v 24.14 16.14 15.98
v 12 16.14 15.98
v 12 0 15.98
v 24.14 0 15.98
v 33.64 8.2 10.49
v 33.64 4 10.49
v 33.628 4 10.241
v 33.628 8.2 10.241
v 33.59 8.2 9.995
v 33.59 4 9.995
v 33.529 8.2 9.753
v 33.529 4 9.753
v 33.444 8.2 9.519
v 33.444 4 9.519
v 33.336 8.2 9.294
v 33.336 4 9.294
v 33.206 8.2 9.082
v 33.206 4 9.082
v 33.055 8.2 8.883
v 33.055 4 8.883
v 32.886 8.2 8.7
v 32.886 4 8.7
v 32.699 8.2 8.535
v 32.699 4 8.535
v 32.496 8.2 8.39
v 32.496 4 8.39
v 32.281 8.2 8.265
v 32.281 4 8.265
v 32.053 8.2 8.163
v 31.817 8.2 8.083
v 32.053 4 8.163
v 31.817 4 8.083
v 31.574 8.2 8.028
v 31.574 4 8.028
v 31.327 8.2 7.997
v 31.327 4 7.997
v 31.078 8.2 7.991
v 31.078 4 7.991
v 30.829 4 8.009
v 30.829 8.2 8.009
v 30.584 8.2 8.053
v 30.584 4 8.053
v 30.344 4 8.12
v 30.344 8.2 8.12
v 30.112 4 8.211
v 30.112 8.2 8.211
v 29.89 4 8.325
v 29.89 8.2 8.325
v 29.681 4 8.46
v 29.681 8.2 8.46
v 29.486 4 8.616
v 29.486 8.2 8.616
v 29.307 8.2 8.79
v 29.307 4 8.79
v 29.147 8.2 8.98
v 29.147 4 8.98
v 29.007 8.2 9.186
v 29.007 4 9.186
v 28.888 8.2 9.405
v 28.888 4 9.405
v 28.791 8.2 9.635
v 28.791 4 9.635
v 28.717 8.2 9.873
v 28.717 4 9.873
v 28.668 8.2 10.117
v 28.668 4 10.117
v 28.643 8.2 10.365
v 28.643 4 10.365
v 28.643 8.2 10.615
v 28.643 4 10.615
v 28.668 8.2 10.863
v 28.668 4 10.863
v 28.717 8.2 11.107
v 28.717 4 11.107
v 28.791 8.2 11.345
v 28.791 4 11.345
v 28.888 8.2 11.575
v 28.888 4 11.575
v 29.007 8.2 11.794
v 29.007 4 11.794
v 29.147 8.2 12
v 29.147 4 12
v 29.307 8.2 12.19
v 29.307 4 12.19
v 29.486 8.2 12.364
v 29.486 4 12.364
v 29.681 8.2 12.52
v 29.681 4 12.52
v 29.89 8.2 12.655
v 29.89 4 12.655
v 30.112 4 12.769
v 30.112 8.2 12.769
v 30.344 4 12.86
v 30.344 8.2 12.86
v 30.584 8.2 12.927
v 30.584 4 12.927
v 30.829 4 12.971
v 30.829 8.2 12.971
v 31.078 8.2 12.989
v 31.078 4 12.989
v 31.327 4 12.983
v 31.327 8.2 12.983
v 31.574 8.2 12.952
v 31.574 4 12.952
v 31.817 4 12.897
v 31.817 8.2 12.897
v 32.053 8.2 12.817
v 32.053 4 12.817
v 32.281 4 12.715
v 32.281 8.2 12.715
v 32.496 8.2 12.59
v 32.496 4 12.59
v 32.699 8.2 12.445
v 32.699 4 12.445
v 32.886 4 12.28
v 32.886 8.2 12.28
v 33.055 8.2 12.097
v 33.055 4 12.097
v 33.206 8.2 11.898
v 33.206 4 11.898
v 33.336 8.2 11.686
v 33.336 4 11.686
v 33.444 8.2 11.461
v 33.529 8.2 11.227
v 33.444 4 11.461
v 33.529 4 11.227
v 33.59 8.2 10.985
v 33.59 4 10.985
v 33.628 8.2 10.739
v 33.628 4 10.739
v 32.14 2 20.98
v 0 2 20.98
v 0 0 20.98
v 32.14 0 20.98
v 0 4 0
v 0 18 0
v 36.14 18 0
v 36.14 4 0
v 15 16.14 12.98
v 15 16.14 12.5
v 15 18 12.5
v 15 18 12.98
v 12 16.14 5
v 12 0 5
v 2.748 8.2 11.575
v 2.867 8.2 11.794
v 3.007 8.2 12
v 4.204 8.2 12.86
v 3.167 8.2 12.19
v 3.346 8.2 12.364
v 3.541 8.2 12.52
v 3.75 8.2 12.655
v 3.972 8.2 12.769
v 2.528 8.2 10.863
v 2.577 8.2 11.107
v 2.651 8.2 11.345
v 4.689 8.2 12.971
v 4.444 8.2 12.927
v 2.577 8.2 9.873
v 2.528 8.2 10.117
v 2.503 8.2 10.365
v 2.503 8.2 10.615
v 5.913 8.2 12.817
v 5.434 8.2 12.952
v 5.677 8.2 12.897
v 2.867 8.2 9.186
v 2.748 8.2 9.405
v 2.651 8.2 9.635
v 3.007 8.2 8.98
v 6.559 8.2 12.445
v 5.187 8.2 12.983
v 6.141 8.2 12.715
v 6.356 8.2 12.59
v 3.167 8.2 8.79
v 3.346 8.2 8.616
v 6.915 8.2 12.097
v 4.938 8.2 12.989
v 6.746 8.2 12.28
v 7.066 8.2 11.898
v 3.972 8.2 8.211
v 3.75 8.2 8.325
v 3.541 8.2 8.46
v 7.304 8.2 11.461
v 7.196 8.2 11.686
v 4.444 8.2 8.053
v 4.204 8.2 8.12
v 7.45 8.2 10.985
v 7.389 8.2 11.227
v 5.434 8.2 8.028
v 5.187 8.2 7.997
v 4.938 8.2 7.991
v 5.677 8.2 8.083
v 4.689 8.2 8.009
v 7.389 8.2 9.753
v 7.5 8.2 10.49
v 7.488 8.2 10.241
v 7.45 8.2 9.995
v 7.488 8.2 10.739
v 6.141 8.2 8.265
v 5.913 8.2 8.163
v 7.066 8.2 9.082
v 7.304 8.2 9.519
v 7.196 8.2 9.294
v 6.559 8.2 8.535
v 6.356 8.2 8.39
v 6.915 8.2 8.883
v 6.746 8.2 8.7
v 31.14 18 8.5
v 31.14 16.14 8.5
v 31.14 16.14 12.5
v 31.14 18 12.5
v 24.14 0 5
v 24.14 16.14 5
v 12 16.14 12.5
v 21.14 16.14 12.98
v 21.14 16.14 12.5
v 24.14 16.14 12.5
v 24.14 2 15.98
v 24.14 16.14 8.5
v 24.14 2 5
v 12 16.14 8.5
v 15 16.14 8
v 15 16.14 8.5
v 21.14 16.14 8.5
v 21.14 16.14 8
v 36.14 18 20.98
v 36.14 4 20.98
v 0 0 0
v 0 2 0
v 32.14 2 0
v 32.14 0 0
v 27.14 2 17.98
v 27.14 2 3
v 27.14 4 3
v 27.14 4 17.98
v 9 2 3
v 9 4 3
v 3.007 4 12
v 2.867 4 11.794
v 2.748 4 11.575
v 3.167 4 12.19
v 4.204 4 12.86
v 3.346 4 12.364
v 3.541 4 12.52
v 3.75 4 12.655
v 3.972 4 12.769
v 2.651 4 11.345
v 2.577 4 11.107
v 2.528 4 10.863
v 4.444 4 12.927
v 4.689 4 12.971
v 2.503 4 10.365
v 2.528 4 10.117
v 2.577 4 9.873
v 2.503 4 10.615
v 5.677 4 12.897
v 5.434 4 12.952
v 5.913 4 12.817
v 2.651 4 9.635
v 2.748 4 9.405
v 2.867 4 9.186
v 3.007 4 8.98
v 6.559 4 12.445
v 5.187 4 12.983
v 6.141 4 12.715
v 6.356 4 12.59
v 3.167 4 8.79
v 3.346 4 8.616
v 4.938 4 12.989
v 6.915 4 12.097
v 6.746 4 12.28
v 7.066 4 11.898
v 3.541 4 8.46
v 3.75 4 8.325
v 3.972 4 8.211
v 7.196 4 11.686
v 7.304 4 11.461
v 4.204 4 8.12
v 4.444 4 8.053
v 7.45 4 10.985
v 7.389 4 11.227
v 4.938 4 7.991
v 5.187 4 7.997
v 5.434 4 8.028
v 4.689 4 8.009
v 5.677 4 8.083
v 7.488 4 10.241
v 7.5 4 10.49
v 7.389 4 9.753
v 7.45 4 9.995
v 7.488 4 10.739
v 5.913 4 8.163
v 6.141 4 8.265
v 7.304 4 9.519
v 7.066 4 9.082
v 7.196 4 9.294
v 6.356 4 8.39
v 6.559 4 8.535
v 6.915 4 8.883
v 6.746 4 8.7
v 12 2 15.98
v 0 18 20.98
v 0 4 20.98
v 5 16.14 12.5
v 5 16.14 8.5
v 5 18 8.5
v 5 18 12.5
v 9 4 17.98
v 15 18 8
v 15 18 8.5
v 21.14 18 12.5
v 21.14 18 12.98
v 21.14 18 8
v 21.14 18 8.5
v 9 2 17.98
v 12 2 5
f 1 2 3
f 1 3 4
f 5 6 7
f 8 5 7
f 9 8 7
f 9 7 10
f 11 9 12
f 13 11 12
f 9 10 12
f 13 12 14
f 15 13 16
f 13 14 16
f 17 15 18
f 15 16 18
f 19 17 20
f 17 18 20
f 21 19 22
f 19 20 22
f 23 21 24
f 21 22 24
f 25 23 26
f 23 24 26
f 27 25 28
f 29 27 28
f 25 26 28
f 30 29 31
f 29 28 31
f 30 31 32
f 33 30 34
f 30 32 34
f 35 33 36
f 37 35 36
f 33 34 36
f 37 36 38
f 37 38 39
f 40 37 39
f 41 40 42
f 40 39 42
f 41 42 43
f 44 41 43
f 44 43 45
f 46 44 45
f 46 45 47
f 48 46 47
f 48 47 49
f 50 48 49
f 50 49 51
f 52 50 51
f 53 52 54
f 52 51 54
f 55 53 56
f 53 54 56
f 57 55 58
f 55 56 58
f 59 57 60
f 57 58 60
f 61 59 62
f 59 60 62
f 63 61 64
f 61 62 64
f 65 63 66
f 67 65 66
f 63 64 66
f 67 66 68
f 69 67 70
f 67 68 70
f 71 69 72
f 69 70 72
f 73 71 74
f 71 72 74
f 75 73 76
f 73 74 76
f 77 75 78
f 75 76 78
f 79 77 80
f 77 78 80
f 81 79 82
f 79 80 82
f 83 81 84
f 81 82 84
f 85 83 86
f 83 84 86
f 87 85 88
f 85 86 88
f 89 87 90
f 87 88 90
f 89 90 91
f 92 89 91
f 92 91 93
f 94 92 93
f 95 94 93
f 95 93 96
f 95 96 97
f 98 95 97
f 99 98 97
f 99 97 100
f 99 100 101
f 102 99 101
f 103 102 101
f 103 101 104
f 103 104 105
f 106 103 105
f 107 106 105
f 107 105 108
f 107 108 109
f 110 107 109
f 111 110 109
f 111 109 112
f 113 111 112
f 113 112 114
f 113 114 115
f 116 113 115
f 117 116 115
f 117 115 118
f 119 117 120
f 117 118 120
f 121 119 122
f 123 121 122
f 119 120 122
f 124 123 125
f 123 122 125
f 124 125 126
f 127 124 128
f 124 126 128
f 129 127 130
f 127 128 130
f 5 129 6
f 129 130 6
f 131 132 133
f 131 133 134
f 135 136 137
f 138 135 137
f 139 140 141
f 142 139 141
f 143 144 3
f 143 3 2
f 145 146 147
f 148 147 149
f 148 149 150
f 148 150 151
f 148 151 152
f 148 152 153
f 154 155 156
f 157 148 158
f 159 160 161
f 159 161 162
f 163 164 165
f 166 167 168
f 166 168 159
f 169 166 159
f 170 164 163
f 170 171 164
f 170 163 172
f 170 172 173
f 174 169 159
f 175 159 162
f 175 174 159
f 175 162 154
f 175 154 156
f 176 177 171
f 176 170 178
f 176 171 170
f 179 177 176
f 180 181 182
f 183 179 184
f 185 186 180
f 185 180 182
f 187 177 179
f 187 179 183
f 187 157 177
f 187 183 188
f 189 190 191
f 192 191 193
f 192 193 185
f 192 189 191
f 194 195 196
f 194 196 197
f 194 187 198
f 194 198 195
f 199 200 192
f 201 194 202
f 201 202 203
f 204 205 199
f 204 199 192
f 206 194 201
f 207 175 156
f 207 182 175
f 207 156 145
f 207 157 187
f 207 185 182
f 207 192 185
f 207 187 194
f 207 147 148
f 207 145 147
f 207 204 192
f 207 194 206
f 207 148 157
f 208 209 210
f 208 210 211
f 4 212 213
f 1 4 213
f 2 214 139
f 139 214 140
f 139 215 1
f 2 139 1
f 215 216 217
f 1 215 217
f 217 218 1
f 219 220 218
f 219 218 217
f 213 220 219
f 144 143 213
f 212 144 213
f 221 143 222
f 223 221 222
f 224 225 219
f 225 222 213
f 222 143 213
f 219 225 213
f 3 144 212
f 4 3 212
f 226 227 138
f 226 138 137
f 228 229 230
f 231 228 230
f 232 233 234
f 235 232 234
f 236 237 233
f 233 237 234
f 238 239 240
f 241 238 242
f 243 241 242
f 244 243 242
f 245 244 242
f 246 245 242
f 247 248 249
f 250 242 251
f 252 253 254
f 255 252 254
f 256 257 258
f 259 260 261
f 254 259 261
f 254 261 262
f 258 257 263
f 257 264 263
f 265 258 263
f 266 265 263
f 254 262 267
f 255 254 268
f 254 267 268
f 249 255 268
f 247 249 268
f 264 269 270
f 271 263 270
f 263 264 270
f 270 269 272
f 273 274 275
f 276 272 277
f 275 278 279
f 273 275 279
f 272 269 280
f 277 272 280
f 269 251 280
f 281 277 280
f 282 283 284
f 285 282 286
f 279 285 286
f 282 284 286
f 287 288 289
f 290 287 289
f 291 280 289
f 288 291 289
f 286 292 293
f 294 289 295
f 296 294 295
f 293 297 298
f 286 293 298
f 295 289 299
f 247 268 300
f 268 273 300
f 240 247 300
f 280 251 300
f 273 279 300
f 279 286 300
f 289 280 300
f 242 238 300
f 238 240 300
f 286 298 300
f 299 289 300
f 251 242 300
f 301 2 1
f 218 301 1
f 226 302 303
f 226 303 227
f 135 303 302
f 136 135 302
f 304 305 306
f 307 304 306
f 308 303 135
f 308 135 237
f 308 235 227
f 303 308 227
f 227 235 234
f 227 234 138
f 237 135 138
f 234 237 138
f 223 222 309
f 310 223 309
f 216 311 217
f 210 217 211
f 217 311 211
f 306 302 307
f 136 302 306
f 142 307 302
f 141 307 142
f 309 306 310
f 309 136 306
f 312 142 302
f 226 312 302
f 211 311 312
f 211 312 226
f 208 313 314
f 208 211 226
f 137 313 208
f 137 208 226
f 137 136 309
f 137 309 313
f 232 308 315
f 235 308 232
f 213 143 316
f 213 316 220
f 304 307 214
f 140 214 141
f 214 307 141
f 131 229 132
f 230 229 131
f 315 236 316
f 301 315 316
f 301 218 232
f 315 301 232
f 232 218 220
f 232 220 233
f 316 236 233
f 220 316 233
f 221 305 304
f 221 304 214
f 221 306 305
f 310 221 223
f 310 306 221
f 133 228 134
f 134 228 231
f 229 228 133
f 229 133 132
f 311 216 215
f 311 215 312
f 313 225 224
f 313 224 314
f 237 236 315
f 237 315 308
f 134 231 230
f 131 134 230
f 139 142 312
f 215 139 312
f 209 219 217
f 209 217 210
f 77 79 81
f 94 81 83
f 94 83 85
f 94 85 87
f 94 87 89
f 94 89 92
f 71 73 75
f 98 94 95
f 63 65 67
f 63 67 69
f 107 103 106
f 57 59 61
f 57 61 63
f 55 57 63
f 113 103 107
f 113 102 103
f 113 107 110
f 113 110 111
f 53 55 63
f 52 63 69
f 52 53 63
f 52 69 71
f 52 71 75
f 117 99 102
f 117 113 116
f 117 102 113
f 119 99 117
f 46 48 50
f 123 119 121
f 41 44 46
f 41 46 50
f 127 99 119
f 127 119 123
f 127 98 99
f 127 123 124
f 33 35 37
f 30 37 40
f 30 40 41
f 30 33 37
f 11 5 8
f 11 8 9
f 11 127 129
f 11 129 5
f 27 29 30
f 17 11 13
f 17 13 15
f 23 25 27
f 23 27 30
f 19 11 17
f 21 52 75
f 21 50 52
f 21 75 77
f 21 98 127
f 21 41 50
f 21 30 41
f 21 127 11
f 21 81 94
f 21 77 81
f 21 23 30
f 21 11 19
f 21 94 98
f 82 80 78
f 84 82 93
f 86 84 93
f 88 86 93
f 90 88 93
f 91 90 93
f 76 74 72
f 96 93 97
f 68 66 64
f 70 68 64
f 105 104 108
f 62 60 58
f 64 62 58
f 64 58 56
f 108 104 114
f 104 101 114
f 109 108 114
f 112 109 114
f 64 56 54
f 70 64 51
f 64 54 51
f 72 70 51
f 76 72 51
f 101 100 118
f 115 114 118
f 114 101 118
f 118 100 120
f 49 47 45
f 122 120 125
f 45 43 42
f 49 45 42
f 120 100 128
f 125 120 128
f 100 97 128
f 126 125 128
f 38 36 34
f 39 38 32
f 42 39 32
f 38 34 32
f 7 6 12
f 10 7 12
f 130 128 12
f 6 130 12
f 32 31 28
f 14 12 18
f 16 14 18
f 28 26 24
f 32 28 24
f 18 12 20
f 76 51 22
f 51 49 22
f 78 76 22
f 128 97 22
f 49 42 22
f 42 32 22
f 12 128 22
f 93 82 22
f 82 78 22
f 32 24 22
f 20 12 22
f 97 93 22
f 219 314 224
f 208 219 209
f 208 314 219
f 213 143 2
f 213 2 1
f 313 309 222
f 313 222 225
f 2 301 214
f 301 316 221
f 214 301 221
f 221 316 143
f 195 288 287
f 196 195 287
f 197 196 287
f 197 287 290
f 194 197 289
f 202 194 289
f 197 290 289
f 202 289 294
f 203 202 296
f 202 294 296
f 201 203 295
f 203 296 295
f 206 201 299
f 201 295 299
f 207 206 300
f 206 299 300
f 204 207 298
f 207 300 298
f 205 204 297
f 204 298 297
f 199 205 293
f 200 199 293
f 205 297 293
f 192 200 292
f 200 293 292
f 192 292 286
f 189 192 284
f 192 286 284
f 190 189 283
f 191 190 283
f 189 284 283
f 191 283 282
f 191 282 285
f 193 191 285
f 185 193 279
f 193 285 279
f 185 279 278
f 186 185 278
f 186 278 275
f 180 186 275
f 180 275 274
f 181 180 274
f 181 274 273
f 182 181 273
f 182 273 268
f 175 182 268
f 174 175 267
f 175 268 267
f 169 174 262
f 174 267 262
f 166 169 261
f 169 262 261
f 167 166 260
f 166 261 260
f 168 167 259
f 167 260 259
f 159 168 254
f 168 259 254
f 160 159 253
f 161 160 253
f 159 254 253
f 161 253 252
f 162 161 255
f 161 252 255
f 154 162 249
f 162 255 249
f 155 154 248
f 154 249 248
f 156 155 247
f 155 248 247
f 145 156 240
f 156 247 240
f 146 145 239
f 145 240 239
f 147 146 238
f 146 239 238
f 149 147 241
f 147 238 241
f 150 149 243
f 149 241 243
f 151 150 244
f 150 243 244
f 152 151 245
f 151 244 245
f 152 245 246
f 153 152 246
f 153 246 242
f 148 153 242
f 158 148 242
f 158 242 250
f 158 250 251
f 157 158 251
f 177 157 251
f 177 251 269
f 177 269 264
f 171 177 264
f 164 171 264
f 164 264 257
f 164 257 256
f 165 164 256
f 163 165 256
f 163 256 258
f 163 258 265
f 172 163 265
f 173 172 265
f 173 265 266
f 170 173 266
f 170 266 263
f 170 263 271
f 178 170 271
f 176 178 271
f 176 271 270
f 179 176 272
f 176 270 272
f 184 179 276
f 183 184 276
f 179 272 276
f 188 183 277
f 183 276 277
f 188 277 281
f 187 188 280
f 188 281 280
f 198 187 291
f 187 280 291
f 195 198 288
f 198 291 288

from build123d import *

# Parameters (mm, degrees)
BOX_W             = 12.14
BOX_H             = 16.14
BOX_DEPTH         = 10.98
BOX001_W          = 32.14
BOX001_H          = 2
BOX001_DEPTH      = 20.98
CYLINDER_R        = 2.5
CYLINDER_DEPTH    = 4.2
CYLINDER001_R     = 2.5
CYLINDER001_DEPTH = 4.2
BOX007_W          = 18.14
BOX007_H          = 4
BOX007_DEPTH      = 14.98
BOX006_W          = 36.14
BOX006_H          = 4
BOX006_DEPTH      = 20.98
BOX004_W          = 26.14
BOX004_H          = 10
BOX004_DEPTH      = 4
BOX003_W          = 6.14
BOX003_H          = 10
BOX003_DEPTH      = 4.98
BOX005_W          = 12.14
BOX005_H          = 16.14
BOX005_DEPTH      = 10.98
BOX002_W          = 36.14
BOX002_H          = 16
BOX002_DEPTH      = 20.98


with BuildPart() as usb:
    # Box → Box (new body)
    with BuildSketch(Plane(origin=(12, 0, 5), x_dir=(1, 0, 0), z_dir=(0, 0, 1))):
        with Locations((6.07, 8.07)):
            Rectangle(BOX_W, BOX_H)
    extrude(amount=BOX_DEPTH)


with BuildPart() as panel:
    # Box001 → Box001 (new body)
    with BuildSketch(Plane.XY):
        with Locations((16.07, 1)):
            Rectangle(BOX001_W, BOX001_H)
    extrude(amount=BOX001_DEPTH)


with BuildPart() as cylinder:
    # Cylinder → Cylinder (new body)
    with BuildSketch(Plane(origin=(5, 4, 10.49), x_dir=(1, 0, 0), z_dir=(0, 1, 0))):
        Circle(CYLINDER_R)
    extrude(amount=CYLINDER_DEPTH)


with BuildPart() as cylinder001:
    # Cylinder001 → Cylinder001 (new body)
    with BuildSketch(Plane(origin=(31.14, 4, 10.49), x_dir=(1, 0, 0), z_dir=(0, 1, 0))):
        Circle(CYLINDER001_R)
    extrude(amount=CYLINDER001_DEPTH)


with BuildPart() as cube005:
    # Box007 → Box007 (new body)
    with BuildSketch(Plane(origin=(9, 0, 3), x_dir=(1, 0, 0), z_dir=(0, 0, 1))):
        with Locations((9.07, 2)):
            Rectangle(BOX007_W, BOX007_H)
    extrude(amount=BOX007_DEPTH)


with BuildPart() as cut003:
    # Box006 → Box006 (new body)
    with BuildSketch(Plane.XY):
        with Locations((18.07, 2)):
            Rectangle(BOX006_W, BOX006_H)
    extrude(amount=BOX006_DEPTH)

    # Cut003: cut Cube005
    add(cube005.part, mode=Mode.SUBTRACT)


with BuildPart() as cube003:
    # Box004 → Box004 (new body)
    with BuildSketch(Plane(origin=(5, 16.14, 8.5), x_dir=(1, 0, 0), z_dir=(0, 0, 1))):
        with Locations((13.07, 5)):
            Rectangle(BOX004_W, BOX004_H)
    extrude(amount=BOX004_DEPTH)


with BuildPart() as cube002:
    # Box003 → Box003 (new body)
    with BuildSketch(Plane(origin=(15, 16.14, 8), x_dir=(1, 0, 0), z_dir=(0, 0, 1))):
        with Locations((3.07, 5)):
            Rectangle(BOX003_W, BOX003_H)
    extrude(amount=BOX003_DEPTH)


with BuildPart() as cube004:
    # Box005 → Box005 (new body)
    with BuildSketch(Plane(origin=(12, 0, 5), x_dir=(1, 0, 0), z_dir=(0, 0, 1))):
        with Locations((6.07, 8.07)):
            Rectangle(BOX005_W, BOX005_H)
    extrude(amount=BOX005_DEPTH)


with BuildPart() as cut004:
    # Box002 → Box002 (new body)
    with BuildSketch(Plane(origin=(0, 2, 0), x_dir=(1, 0, 0), z_dir=(0, 0, 1))):
        with Locations((18.07, 8)):
            Rectangle(BOX002_W, BOX002_H)
    extrude(amount=BOX002_DEPTH)

    # Cut: cut Cube004
    add(cube004.part, mode=Mode.SUBTRACT)

    # Cut001: cut Cube002
    add(cube002.part, mode=Mode.SUBTRACT)

    # Cut002: cut Cube003
    add(cube003.part, mode=Mode.SUBTRACT)

    # Cut004: cut Cut003
    add(cut003.part, mode=Mode.SUBTRACT)


solid = Compound([usb.part, panel.part, cylinder.part, cylinder001.part, cut004.part])
